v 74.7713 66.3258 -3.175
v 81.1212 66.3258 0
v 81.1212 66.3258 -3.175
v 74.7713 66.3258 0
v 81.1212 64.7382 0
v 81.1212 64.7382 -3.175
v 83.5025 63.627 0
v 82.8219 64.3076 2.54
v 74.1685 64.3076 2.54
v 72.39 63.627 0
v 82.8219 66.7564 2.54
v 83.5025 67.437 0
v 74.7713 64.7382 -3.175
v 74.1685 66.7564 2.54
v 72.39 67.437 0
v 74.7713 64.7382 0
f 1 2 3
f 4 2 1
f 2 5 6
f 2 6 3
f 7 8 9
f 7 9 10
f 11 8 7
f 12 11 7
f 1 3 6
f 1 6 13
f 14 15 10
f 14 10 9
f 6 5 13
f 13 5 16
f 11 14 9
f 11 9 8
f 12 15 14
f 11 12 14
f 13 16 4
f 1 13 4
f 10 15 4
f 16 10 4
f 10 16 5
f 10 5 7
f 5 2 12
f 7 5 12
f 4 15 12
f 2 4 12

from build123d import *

# Parameters (mm, degrees)
SKETCH1_W           = 11.1125
SKETCH1_H           = 3.81
BOSS_EXTRUDE1_DEPTH = 2.54
CHAMFER1_SIZE       = 2.54
CHAMFER1_SIZE_2     = 1.778527147
CHAMFER2_SIZE       = 0.680590949
CHAMFER2_SIZE_2     = 2.54
SKETCH2_W           = 6.35
SKETCH2_H           = 1.5875
BOSS_EXTRUDE2_DEPTH = 3.175


with BuildPart() as part:
    # Sketch1 → Boss-Extrude1 (new body)
    with BuildSketch(Plane.XY):
        with Locations((77.94625, 65.532)):
            Rectangle(SKETCH1_W, SKETCH1_H)
    extrude(amount=BOSS_EXTRUDE1_DEPTH)

    # Chamfer1
    # the kernel refuses this chamfer: 2.54, 1.778527147 mm, written as the material it takes off along each edge
    with BuildSketch(Plane(origin=(72.39, 73.996682665, 2.54), x_dir=(-0.02220967419845826, 0, -0.9997533347641299), z_dir=(0, -1, 0))) as chamfer1_piece_1:
        Polygon((CHAMFER1_SIZE * 0.999753334764, CHAMFER1_SIZE * 0.0222096741985), (-CHAMFER1_SIZE_2 * 0.0222096741991, CHAMFER1_SIZE_2 * 0.999753334794), (0, 0), align=None)
    extrude(amount=16.92936533, mode=Mode.SUBTRACT)

    # Chamfer2
    # the kernel refuses this chamfer: 2.54, 0.680590949 mm, written as the material it takes off along each edge
    with BuildSketch(Plane(origin=(67.572854359, 63.627, 2.54), x_dir=(0, 0.9905000388259545, 0.13751244702128823), z_dir=(1, 0, 0))) as chamfer2_piece_1:
        Polygon((CHAMFER2_SIZE * 0.990500038499, -CHAMFER2_SIZE * 0.137512446976), (-CHAMFER2_SIZE_2 * 0.137512447021, -CHAMFER2_SIZE_2 * 0.990500038826), (0, 0), align=None)
    extrude(amount=22.52531843, mode=Mode.SUBTRACT)
    with BuildSketch(Plane(origin=(83.5025, 57.031327212, 2.54), x_dir=(-0.9905000388259543, 0, 0.13751244702128956), z_dir=(0, 1, 0))) as chamfer2_piece_2:
        Polygon((CHAMFER2_SIZE * 0.990500038499, -CHAMFER2_SIZE * 0.137512446976), (-CHAMFER2_SIZE_2 * 0.137512447021, -CHAMFER2_SIZE_2 * 0.990500038826), (0, 0), align=None)
    extrude(amount=17.001345577, mode=Mode.SUBTRACT)
    with BuildSketch(Plane(origin=(90.098172788, 67.437, 2.54), x_dir=(0, 0.009967146577158238, -0.9999503267608394), z_dir=(-1, 0, 0))) as chamfer2_piece_3:
        Polygon((CHAMFER2_SIZE_2 * 0.999950326761, CHAMFER2_SIZE_2 * 0.00996714657716), (-CHAMFER2_SIZE * 0.00996714657386, CHAMFER2_SIZE * 0.99995032643), (0, 0), align=None)
    extrude(amount=22.52531843, mode=Mode.SUBTRACT)

    # Sketch2 → Boss-Extrude2 (add)
    with BuildSketch(Plane(origin=(0, 0, 0), x_dir=(-1, 0, 0), z_dir=(0, 0, -1))):
        with Locations((-77.94625, 65.532)):
            Rectangle(SKETCH2_W, SKETCH2_H)
    extrude(amount=BOSS_EXTRUDE2_DEPTH)


solid = part.part
